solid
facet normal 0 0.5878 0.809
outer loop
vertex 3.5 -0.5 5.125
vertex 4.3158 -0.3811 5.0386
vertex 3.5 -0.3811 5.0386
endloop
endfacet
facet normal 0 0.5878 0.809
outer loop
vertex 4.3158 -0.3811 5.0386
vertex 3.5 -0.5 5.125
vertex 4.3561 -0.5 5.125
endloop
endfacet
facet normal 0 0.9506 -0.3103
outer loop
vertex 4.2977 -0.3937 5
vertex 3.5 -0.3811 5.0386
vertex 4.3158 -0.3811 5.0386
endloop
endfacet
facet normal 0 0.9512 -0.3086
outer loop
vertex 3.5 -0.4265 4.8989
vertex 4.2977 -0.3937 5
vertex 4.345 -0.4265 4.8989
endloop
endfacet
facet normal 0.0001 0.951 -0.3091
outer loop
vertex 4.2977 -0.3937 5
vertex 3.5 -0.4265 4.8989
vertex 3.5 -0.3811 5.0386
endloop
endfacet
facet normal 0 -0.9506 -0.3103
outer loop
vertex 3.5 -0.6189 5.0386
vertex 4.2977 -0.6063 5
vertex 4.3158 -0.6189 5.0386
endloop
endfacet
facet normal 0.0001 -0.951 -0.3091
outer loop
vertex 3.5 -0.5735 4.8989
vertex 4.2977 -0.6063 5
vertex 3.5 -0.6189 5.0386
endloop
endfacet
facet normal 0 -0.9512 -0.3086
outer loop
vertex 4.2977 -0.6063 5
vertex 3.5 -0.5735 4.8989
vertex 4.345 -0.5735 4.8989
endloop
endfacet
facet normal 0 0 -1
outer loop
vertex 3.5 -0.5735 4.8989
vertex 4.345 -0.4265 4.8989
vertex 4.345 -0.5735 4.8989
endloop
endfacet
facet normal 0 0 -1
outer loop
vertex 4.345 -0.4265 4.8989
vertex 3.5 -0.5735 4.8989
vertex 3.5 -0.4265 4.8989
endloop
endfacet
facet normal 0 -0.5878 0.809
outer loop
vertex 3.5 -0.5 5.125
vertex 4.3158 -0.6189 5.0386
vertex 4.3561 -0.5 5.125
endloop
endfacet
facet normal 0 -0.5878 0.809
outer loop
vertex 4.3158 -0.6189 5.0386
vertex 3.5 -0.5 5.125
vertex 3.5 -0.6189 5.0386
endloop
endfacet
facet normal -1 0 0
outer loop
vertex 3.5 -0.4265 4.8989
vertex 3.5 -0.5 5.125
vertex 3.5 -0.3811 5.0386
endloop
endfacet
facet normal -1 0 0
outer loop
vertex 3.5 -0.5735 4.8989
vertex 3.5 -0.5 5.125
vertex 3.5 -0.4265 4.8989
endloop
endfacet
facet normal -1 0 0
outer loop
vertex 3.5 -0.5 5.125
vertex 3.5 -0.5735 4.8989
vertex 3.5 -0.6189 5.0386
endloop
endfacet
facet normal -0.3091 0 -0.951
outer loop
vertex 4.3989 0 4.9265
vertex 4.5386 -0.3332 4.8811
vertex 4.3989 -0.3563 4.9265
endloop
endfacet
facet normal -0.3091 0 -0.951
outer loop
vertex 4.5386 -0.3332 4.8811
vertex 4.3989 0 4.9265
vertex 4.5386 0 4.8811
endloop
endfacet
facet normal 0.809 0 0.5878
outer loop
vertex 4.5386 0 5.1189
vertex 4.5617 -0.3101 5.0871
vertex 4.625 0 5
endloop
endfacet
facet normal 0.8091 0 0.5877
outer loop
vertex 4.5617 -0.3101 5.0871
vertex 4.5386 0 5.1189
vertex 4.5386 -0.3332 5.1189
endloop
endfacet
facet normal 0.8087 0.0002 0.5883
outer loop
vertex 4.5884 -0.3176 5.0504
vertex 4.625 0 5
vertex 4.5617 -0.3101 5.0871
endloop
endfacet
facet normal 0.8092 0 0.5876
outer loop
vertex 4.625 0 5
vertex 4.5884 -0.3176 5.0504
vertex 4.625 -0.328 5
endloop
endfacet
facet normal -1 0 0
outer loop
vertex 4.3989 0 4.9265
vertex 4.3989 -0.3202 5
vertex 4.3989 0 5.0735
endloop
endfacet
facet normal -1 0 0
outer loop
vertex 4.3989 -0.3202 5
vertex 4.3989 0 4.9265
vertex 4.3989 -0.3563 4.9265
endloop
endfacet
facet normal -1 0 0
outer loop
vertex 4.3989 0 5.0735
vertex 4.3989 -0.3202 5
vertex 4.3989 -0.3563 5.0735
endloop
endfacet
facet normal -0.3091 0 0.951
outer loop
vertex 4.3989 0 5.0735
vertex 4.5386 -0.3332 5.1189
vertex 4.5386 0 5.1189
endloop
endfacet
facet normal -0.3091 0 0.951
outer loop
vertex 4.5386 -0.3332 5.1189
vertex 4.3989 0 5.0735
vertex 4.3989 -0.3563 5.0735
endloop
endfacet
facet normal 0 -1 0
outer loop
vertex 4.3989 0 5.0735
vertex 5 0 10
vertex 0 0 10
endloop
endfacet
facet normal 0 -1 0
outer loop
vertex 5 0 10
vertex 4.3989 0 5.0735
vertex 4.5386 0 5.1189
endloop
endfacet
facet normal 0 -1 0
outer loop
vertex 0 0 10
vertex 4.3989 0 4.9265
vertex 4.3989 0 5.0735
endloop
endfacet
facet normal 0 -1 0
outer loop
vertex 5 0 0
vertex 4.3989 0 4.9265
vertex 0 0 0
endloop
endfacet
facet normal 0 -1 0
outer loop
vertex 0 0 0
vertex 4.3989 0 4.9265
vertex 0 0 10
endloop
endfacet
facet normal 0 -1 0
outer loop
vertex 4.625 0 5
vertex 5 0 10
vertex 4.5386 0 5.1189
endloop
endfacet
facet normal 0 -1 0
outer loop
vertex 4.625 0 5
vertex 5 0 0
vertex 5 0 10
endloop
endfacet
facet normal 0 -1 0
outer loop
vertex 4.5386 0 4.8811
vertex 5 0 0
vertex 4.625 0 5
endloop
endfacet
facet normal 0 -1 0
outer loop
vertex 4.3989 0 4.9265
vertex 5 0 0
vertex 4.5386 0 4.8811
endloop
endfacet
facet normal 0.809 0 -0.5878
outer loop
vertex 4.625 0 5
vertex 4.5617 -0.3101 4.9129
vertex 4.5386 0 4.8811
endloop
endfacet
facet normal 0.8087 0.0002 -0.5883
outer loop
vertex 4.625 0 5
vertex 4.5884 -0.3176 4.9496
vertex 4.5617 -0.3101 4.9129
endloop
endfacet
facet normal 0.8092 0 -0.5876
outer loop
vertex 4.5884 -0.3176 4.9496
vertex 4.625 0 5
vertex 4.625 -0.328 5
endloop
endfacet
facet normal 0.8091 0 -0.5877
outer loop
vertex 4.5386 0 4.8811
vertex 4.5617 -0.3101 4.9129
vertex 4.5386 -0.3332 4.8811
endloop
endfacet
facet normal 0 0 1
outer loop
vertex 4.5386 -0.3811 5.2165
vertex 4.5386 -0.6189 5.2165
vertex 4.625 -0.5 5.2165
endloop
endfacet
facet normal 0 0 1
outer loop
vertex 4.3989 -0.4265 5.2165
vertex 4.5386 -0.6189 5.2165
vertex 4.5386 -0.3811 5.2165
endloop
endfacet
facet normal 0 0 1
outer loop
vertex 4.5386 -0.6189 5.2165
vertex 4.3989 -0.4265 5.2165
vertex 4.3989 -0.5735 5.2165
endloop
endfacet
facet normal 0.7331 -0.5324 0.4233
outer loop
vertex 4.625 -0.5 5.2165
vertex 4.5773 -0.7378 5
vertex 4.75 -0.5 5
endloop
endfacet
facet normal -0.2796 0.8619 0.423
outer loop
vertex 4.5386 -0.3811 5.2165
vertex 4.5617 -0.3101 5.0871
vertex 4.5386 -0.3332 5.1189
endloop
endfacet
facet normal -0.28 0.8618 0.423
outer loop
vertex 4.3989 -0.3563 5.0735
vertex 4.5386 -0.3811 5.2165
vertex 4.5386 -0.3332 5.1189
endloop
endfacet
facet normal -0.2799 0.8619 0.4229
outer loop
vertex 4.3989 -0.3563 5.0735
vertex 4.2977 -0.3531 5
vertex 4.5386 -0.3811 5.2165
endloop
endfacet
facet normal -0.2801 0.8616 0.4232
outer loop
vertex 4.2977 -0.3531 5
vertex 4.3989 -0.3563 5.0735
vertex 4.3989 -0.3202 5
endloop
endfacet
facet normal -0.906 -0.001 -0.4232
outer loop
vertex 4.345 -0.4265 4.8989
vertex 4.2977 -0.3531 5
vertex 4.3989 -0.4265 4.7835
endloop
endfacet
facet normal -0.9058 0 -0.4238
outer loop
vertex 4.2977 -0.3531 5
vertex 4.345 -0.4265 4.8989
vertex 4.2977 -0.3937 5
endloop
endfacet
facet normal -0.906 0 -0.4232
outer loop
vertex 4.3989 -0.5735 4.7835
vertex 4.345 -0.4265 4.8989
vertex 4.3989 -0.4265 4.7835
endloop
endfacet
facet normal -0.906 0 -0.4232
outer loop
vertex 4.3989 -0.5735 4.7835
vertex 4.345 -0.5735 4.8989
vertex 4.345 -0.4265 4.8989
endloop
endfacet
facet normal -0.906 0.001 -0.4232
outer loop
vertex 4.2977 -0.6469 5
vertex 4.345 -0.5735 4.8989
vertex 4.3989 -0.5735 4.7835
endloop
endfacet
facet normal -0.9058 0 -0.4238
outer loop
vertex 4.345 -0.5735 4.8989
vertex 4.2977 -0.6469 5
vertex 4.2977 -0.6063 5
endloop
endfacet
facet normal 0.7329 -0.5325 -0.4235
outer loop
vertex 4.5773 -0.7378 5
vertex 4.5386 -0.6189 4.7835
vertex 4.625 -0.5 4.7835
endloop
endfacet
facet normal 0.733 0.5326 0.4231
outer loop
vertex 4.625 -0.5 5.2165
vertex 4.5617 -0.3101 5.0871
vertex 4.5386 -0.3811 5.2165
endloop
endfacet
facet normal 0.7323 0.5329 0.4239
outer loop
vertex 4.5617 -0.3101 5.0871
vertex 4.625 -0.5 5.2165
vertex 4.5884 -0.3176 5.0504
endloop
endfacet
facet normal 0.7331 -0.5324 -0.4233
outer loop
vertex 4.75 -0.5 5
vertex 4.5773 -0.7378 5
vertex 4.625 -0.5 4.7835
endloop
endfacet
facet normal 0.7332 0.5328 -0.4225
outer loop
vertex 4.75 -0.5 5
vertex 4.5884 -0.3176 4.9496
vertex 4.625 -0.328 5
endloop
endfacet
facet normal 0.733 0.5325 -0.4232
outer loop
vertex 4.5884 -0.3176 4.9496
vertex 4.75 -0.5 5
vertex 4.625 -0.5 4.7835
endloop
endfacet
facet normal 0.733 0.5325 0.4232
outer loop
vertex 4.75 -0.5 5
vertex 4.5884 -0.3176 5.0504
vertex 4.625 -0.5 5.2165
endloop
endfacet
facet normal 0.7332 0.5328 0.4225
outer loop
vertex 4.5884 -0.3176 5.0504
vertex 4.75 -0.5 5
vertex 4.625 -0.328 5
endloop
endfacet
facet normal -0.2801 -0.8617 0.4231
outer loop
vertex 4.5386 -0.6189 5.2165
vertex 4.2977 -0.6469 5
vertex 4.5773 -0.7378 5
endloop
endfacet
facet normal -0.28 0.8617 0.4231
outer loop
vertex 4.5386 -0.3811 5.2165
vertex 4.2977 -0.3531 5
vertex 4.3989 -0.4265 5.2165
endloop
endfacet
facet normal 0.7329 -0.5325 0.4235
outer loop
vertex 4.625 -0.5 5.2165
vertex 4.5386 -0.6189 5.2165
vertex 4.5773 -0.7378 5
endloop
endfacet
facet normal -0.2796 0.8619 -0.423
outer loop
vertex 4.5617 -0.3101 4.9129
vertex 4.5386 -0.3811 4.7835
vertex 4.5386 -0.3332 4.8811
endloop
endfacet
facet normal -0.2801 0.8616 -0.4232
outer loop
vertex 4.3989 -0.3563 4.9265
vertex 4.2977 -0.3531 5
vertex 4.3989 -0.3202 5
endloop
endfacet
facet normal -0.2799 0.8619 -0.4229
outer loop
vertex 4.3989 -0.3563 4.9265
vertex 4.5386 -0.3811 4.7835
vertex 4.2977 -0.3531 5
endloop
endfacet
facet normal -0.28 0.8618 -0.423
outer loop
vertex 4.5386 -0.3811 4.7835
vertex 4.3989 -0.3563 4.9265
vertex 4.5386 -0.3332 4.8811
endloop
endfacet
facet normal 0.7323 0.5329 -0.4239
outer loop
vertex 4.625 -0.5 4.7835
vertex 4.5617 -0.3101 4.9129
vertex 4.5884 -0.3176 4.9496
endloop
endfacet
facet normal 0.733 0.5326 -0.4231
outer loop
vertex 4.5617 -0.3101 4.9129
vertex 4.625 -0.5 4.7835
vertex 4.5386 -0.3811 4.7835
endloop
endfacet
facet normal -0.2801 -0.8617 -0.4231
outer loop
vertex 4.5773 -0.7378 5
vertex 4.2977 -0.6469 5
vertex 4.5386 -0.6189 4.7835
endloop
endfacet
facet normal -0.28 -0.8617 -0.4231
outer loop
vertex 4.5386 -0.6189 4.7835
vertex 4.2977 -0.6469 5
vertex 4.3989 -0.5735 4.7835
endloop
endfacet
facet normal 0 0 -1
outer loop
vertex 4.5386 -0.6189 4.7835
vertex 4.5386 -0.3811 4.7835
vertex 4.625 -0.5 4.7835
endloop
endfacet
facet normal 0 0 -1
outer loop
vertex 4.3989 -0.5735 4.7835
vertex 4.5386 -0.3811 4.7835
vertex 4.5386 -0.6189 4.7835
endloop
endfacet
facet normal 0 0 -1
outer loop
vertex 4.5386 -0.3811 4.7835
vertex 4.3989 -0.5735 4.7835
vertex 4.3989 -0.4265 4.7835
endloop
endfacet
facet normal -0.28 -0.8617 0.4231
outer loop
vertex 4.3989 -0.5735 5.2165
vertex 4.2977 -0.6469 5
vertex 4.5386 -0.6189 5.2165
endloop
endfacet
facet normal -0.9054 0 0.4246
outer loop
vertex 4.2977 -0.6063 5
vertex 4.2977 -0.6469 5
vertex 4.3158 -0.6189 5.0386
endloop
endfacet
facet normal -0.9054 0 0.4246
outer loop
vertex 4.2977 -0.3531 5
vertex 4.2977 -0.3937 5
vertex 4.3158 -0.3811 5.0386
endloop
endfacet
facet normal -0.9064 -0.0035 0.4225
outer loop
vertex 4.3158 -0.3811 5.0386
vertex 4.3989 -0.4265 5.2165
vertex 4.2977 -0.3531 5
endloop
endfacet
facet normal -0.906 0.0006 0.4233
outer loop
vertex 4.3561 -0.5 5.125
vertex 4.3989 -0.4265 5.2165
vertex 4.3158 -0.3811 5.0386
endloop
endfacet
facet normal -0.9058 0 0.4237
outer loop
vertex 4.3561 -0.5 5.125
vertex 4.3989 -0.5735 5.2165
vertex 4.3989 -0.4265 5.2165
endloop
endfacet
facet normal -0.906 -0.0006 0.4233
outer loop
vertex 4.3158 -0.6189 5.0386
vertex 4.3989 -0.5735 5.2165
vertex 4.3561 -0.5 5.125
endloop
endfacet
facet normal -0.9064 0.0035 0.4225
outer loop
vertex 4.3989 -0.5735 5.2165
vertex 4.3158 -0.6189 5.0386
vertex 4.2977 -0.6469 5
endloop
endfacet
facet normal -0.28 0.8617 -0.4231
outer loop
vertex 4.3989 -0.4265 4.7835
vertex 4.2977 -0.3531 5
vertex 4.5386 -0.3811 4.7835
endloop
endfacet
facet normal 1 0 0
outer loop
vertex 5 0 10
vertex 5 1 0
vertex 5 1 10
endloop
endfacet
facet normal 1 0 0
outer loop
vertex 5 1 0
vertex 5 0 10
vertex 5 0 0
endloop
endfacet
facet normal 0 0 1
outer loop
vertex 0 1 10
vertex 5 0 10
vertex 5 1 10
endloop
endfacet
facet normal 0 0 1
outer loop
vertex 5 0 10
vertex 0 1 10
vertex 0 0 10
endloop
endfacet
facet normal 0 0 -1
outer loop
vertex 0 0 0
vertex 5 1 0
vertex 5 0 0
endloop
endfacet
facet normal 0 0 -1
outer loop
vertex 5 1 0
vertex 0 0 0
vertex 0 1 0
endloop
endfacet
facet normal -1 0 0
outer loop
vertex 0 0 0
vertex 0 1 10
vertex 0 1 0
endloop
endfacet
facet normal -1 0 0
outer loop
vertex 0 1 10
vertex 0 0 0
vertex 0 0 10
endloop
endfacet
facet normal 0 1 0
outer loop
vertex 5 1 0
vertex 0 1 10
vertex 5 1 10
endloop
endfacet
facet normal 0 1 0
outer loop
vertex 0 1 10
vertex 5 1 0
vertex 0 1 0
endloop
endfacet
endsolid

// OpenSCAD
//Call function
door(10);


// Door module that brings together all elements
module door(cube_size) {
    // dimensions
    width = cube_size/2; 
    height = 10;
    thick = 1;
    x = 1;
    y = thick;
    z = cube_size/10;
    sca = (cube_size/200)*5; //scaling for handle varying w cube_size
    handlex = 9*(cube_size/20); //handle translations according to cube_size
    handley = 0;
    handlez = 10*(cube_size/20); 
    union(){
        scale([x, y, z]){
            cube([width, thick, height]);
        }
        translate([handlex,handley,handlez]){
            scale([sca,sca,sca]){
                handle();
                round_knob();
            }
        }
    }
}
//********* End of Module ***********


module round_knob() {
    translate([0,-2,0])
        sphere(d=2);
    rotate([90,0,0])
        cylinder(d=1, h=2);
}
//********* End of Module ***********


module handle() {
    rotate([90,0,0])
        cylinder(d=1, h=2);
    translate([0,-2,0]) {
        rotate([0,-90,0])
            cylinder(d=1, h=4);
        sphere(d=1);
    }
}
//********* End of Module ***********
